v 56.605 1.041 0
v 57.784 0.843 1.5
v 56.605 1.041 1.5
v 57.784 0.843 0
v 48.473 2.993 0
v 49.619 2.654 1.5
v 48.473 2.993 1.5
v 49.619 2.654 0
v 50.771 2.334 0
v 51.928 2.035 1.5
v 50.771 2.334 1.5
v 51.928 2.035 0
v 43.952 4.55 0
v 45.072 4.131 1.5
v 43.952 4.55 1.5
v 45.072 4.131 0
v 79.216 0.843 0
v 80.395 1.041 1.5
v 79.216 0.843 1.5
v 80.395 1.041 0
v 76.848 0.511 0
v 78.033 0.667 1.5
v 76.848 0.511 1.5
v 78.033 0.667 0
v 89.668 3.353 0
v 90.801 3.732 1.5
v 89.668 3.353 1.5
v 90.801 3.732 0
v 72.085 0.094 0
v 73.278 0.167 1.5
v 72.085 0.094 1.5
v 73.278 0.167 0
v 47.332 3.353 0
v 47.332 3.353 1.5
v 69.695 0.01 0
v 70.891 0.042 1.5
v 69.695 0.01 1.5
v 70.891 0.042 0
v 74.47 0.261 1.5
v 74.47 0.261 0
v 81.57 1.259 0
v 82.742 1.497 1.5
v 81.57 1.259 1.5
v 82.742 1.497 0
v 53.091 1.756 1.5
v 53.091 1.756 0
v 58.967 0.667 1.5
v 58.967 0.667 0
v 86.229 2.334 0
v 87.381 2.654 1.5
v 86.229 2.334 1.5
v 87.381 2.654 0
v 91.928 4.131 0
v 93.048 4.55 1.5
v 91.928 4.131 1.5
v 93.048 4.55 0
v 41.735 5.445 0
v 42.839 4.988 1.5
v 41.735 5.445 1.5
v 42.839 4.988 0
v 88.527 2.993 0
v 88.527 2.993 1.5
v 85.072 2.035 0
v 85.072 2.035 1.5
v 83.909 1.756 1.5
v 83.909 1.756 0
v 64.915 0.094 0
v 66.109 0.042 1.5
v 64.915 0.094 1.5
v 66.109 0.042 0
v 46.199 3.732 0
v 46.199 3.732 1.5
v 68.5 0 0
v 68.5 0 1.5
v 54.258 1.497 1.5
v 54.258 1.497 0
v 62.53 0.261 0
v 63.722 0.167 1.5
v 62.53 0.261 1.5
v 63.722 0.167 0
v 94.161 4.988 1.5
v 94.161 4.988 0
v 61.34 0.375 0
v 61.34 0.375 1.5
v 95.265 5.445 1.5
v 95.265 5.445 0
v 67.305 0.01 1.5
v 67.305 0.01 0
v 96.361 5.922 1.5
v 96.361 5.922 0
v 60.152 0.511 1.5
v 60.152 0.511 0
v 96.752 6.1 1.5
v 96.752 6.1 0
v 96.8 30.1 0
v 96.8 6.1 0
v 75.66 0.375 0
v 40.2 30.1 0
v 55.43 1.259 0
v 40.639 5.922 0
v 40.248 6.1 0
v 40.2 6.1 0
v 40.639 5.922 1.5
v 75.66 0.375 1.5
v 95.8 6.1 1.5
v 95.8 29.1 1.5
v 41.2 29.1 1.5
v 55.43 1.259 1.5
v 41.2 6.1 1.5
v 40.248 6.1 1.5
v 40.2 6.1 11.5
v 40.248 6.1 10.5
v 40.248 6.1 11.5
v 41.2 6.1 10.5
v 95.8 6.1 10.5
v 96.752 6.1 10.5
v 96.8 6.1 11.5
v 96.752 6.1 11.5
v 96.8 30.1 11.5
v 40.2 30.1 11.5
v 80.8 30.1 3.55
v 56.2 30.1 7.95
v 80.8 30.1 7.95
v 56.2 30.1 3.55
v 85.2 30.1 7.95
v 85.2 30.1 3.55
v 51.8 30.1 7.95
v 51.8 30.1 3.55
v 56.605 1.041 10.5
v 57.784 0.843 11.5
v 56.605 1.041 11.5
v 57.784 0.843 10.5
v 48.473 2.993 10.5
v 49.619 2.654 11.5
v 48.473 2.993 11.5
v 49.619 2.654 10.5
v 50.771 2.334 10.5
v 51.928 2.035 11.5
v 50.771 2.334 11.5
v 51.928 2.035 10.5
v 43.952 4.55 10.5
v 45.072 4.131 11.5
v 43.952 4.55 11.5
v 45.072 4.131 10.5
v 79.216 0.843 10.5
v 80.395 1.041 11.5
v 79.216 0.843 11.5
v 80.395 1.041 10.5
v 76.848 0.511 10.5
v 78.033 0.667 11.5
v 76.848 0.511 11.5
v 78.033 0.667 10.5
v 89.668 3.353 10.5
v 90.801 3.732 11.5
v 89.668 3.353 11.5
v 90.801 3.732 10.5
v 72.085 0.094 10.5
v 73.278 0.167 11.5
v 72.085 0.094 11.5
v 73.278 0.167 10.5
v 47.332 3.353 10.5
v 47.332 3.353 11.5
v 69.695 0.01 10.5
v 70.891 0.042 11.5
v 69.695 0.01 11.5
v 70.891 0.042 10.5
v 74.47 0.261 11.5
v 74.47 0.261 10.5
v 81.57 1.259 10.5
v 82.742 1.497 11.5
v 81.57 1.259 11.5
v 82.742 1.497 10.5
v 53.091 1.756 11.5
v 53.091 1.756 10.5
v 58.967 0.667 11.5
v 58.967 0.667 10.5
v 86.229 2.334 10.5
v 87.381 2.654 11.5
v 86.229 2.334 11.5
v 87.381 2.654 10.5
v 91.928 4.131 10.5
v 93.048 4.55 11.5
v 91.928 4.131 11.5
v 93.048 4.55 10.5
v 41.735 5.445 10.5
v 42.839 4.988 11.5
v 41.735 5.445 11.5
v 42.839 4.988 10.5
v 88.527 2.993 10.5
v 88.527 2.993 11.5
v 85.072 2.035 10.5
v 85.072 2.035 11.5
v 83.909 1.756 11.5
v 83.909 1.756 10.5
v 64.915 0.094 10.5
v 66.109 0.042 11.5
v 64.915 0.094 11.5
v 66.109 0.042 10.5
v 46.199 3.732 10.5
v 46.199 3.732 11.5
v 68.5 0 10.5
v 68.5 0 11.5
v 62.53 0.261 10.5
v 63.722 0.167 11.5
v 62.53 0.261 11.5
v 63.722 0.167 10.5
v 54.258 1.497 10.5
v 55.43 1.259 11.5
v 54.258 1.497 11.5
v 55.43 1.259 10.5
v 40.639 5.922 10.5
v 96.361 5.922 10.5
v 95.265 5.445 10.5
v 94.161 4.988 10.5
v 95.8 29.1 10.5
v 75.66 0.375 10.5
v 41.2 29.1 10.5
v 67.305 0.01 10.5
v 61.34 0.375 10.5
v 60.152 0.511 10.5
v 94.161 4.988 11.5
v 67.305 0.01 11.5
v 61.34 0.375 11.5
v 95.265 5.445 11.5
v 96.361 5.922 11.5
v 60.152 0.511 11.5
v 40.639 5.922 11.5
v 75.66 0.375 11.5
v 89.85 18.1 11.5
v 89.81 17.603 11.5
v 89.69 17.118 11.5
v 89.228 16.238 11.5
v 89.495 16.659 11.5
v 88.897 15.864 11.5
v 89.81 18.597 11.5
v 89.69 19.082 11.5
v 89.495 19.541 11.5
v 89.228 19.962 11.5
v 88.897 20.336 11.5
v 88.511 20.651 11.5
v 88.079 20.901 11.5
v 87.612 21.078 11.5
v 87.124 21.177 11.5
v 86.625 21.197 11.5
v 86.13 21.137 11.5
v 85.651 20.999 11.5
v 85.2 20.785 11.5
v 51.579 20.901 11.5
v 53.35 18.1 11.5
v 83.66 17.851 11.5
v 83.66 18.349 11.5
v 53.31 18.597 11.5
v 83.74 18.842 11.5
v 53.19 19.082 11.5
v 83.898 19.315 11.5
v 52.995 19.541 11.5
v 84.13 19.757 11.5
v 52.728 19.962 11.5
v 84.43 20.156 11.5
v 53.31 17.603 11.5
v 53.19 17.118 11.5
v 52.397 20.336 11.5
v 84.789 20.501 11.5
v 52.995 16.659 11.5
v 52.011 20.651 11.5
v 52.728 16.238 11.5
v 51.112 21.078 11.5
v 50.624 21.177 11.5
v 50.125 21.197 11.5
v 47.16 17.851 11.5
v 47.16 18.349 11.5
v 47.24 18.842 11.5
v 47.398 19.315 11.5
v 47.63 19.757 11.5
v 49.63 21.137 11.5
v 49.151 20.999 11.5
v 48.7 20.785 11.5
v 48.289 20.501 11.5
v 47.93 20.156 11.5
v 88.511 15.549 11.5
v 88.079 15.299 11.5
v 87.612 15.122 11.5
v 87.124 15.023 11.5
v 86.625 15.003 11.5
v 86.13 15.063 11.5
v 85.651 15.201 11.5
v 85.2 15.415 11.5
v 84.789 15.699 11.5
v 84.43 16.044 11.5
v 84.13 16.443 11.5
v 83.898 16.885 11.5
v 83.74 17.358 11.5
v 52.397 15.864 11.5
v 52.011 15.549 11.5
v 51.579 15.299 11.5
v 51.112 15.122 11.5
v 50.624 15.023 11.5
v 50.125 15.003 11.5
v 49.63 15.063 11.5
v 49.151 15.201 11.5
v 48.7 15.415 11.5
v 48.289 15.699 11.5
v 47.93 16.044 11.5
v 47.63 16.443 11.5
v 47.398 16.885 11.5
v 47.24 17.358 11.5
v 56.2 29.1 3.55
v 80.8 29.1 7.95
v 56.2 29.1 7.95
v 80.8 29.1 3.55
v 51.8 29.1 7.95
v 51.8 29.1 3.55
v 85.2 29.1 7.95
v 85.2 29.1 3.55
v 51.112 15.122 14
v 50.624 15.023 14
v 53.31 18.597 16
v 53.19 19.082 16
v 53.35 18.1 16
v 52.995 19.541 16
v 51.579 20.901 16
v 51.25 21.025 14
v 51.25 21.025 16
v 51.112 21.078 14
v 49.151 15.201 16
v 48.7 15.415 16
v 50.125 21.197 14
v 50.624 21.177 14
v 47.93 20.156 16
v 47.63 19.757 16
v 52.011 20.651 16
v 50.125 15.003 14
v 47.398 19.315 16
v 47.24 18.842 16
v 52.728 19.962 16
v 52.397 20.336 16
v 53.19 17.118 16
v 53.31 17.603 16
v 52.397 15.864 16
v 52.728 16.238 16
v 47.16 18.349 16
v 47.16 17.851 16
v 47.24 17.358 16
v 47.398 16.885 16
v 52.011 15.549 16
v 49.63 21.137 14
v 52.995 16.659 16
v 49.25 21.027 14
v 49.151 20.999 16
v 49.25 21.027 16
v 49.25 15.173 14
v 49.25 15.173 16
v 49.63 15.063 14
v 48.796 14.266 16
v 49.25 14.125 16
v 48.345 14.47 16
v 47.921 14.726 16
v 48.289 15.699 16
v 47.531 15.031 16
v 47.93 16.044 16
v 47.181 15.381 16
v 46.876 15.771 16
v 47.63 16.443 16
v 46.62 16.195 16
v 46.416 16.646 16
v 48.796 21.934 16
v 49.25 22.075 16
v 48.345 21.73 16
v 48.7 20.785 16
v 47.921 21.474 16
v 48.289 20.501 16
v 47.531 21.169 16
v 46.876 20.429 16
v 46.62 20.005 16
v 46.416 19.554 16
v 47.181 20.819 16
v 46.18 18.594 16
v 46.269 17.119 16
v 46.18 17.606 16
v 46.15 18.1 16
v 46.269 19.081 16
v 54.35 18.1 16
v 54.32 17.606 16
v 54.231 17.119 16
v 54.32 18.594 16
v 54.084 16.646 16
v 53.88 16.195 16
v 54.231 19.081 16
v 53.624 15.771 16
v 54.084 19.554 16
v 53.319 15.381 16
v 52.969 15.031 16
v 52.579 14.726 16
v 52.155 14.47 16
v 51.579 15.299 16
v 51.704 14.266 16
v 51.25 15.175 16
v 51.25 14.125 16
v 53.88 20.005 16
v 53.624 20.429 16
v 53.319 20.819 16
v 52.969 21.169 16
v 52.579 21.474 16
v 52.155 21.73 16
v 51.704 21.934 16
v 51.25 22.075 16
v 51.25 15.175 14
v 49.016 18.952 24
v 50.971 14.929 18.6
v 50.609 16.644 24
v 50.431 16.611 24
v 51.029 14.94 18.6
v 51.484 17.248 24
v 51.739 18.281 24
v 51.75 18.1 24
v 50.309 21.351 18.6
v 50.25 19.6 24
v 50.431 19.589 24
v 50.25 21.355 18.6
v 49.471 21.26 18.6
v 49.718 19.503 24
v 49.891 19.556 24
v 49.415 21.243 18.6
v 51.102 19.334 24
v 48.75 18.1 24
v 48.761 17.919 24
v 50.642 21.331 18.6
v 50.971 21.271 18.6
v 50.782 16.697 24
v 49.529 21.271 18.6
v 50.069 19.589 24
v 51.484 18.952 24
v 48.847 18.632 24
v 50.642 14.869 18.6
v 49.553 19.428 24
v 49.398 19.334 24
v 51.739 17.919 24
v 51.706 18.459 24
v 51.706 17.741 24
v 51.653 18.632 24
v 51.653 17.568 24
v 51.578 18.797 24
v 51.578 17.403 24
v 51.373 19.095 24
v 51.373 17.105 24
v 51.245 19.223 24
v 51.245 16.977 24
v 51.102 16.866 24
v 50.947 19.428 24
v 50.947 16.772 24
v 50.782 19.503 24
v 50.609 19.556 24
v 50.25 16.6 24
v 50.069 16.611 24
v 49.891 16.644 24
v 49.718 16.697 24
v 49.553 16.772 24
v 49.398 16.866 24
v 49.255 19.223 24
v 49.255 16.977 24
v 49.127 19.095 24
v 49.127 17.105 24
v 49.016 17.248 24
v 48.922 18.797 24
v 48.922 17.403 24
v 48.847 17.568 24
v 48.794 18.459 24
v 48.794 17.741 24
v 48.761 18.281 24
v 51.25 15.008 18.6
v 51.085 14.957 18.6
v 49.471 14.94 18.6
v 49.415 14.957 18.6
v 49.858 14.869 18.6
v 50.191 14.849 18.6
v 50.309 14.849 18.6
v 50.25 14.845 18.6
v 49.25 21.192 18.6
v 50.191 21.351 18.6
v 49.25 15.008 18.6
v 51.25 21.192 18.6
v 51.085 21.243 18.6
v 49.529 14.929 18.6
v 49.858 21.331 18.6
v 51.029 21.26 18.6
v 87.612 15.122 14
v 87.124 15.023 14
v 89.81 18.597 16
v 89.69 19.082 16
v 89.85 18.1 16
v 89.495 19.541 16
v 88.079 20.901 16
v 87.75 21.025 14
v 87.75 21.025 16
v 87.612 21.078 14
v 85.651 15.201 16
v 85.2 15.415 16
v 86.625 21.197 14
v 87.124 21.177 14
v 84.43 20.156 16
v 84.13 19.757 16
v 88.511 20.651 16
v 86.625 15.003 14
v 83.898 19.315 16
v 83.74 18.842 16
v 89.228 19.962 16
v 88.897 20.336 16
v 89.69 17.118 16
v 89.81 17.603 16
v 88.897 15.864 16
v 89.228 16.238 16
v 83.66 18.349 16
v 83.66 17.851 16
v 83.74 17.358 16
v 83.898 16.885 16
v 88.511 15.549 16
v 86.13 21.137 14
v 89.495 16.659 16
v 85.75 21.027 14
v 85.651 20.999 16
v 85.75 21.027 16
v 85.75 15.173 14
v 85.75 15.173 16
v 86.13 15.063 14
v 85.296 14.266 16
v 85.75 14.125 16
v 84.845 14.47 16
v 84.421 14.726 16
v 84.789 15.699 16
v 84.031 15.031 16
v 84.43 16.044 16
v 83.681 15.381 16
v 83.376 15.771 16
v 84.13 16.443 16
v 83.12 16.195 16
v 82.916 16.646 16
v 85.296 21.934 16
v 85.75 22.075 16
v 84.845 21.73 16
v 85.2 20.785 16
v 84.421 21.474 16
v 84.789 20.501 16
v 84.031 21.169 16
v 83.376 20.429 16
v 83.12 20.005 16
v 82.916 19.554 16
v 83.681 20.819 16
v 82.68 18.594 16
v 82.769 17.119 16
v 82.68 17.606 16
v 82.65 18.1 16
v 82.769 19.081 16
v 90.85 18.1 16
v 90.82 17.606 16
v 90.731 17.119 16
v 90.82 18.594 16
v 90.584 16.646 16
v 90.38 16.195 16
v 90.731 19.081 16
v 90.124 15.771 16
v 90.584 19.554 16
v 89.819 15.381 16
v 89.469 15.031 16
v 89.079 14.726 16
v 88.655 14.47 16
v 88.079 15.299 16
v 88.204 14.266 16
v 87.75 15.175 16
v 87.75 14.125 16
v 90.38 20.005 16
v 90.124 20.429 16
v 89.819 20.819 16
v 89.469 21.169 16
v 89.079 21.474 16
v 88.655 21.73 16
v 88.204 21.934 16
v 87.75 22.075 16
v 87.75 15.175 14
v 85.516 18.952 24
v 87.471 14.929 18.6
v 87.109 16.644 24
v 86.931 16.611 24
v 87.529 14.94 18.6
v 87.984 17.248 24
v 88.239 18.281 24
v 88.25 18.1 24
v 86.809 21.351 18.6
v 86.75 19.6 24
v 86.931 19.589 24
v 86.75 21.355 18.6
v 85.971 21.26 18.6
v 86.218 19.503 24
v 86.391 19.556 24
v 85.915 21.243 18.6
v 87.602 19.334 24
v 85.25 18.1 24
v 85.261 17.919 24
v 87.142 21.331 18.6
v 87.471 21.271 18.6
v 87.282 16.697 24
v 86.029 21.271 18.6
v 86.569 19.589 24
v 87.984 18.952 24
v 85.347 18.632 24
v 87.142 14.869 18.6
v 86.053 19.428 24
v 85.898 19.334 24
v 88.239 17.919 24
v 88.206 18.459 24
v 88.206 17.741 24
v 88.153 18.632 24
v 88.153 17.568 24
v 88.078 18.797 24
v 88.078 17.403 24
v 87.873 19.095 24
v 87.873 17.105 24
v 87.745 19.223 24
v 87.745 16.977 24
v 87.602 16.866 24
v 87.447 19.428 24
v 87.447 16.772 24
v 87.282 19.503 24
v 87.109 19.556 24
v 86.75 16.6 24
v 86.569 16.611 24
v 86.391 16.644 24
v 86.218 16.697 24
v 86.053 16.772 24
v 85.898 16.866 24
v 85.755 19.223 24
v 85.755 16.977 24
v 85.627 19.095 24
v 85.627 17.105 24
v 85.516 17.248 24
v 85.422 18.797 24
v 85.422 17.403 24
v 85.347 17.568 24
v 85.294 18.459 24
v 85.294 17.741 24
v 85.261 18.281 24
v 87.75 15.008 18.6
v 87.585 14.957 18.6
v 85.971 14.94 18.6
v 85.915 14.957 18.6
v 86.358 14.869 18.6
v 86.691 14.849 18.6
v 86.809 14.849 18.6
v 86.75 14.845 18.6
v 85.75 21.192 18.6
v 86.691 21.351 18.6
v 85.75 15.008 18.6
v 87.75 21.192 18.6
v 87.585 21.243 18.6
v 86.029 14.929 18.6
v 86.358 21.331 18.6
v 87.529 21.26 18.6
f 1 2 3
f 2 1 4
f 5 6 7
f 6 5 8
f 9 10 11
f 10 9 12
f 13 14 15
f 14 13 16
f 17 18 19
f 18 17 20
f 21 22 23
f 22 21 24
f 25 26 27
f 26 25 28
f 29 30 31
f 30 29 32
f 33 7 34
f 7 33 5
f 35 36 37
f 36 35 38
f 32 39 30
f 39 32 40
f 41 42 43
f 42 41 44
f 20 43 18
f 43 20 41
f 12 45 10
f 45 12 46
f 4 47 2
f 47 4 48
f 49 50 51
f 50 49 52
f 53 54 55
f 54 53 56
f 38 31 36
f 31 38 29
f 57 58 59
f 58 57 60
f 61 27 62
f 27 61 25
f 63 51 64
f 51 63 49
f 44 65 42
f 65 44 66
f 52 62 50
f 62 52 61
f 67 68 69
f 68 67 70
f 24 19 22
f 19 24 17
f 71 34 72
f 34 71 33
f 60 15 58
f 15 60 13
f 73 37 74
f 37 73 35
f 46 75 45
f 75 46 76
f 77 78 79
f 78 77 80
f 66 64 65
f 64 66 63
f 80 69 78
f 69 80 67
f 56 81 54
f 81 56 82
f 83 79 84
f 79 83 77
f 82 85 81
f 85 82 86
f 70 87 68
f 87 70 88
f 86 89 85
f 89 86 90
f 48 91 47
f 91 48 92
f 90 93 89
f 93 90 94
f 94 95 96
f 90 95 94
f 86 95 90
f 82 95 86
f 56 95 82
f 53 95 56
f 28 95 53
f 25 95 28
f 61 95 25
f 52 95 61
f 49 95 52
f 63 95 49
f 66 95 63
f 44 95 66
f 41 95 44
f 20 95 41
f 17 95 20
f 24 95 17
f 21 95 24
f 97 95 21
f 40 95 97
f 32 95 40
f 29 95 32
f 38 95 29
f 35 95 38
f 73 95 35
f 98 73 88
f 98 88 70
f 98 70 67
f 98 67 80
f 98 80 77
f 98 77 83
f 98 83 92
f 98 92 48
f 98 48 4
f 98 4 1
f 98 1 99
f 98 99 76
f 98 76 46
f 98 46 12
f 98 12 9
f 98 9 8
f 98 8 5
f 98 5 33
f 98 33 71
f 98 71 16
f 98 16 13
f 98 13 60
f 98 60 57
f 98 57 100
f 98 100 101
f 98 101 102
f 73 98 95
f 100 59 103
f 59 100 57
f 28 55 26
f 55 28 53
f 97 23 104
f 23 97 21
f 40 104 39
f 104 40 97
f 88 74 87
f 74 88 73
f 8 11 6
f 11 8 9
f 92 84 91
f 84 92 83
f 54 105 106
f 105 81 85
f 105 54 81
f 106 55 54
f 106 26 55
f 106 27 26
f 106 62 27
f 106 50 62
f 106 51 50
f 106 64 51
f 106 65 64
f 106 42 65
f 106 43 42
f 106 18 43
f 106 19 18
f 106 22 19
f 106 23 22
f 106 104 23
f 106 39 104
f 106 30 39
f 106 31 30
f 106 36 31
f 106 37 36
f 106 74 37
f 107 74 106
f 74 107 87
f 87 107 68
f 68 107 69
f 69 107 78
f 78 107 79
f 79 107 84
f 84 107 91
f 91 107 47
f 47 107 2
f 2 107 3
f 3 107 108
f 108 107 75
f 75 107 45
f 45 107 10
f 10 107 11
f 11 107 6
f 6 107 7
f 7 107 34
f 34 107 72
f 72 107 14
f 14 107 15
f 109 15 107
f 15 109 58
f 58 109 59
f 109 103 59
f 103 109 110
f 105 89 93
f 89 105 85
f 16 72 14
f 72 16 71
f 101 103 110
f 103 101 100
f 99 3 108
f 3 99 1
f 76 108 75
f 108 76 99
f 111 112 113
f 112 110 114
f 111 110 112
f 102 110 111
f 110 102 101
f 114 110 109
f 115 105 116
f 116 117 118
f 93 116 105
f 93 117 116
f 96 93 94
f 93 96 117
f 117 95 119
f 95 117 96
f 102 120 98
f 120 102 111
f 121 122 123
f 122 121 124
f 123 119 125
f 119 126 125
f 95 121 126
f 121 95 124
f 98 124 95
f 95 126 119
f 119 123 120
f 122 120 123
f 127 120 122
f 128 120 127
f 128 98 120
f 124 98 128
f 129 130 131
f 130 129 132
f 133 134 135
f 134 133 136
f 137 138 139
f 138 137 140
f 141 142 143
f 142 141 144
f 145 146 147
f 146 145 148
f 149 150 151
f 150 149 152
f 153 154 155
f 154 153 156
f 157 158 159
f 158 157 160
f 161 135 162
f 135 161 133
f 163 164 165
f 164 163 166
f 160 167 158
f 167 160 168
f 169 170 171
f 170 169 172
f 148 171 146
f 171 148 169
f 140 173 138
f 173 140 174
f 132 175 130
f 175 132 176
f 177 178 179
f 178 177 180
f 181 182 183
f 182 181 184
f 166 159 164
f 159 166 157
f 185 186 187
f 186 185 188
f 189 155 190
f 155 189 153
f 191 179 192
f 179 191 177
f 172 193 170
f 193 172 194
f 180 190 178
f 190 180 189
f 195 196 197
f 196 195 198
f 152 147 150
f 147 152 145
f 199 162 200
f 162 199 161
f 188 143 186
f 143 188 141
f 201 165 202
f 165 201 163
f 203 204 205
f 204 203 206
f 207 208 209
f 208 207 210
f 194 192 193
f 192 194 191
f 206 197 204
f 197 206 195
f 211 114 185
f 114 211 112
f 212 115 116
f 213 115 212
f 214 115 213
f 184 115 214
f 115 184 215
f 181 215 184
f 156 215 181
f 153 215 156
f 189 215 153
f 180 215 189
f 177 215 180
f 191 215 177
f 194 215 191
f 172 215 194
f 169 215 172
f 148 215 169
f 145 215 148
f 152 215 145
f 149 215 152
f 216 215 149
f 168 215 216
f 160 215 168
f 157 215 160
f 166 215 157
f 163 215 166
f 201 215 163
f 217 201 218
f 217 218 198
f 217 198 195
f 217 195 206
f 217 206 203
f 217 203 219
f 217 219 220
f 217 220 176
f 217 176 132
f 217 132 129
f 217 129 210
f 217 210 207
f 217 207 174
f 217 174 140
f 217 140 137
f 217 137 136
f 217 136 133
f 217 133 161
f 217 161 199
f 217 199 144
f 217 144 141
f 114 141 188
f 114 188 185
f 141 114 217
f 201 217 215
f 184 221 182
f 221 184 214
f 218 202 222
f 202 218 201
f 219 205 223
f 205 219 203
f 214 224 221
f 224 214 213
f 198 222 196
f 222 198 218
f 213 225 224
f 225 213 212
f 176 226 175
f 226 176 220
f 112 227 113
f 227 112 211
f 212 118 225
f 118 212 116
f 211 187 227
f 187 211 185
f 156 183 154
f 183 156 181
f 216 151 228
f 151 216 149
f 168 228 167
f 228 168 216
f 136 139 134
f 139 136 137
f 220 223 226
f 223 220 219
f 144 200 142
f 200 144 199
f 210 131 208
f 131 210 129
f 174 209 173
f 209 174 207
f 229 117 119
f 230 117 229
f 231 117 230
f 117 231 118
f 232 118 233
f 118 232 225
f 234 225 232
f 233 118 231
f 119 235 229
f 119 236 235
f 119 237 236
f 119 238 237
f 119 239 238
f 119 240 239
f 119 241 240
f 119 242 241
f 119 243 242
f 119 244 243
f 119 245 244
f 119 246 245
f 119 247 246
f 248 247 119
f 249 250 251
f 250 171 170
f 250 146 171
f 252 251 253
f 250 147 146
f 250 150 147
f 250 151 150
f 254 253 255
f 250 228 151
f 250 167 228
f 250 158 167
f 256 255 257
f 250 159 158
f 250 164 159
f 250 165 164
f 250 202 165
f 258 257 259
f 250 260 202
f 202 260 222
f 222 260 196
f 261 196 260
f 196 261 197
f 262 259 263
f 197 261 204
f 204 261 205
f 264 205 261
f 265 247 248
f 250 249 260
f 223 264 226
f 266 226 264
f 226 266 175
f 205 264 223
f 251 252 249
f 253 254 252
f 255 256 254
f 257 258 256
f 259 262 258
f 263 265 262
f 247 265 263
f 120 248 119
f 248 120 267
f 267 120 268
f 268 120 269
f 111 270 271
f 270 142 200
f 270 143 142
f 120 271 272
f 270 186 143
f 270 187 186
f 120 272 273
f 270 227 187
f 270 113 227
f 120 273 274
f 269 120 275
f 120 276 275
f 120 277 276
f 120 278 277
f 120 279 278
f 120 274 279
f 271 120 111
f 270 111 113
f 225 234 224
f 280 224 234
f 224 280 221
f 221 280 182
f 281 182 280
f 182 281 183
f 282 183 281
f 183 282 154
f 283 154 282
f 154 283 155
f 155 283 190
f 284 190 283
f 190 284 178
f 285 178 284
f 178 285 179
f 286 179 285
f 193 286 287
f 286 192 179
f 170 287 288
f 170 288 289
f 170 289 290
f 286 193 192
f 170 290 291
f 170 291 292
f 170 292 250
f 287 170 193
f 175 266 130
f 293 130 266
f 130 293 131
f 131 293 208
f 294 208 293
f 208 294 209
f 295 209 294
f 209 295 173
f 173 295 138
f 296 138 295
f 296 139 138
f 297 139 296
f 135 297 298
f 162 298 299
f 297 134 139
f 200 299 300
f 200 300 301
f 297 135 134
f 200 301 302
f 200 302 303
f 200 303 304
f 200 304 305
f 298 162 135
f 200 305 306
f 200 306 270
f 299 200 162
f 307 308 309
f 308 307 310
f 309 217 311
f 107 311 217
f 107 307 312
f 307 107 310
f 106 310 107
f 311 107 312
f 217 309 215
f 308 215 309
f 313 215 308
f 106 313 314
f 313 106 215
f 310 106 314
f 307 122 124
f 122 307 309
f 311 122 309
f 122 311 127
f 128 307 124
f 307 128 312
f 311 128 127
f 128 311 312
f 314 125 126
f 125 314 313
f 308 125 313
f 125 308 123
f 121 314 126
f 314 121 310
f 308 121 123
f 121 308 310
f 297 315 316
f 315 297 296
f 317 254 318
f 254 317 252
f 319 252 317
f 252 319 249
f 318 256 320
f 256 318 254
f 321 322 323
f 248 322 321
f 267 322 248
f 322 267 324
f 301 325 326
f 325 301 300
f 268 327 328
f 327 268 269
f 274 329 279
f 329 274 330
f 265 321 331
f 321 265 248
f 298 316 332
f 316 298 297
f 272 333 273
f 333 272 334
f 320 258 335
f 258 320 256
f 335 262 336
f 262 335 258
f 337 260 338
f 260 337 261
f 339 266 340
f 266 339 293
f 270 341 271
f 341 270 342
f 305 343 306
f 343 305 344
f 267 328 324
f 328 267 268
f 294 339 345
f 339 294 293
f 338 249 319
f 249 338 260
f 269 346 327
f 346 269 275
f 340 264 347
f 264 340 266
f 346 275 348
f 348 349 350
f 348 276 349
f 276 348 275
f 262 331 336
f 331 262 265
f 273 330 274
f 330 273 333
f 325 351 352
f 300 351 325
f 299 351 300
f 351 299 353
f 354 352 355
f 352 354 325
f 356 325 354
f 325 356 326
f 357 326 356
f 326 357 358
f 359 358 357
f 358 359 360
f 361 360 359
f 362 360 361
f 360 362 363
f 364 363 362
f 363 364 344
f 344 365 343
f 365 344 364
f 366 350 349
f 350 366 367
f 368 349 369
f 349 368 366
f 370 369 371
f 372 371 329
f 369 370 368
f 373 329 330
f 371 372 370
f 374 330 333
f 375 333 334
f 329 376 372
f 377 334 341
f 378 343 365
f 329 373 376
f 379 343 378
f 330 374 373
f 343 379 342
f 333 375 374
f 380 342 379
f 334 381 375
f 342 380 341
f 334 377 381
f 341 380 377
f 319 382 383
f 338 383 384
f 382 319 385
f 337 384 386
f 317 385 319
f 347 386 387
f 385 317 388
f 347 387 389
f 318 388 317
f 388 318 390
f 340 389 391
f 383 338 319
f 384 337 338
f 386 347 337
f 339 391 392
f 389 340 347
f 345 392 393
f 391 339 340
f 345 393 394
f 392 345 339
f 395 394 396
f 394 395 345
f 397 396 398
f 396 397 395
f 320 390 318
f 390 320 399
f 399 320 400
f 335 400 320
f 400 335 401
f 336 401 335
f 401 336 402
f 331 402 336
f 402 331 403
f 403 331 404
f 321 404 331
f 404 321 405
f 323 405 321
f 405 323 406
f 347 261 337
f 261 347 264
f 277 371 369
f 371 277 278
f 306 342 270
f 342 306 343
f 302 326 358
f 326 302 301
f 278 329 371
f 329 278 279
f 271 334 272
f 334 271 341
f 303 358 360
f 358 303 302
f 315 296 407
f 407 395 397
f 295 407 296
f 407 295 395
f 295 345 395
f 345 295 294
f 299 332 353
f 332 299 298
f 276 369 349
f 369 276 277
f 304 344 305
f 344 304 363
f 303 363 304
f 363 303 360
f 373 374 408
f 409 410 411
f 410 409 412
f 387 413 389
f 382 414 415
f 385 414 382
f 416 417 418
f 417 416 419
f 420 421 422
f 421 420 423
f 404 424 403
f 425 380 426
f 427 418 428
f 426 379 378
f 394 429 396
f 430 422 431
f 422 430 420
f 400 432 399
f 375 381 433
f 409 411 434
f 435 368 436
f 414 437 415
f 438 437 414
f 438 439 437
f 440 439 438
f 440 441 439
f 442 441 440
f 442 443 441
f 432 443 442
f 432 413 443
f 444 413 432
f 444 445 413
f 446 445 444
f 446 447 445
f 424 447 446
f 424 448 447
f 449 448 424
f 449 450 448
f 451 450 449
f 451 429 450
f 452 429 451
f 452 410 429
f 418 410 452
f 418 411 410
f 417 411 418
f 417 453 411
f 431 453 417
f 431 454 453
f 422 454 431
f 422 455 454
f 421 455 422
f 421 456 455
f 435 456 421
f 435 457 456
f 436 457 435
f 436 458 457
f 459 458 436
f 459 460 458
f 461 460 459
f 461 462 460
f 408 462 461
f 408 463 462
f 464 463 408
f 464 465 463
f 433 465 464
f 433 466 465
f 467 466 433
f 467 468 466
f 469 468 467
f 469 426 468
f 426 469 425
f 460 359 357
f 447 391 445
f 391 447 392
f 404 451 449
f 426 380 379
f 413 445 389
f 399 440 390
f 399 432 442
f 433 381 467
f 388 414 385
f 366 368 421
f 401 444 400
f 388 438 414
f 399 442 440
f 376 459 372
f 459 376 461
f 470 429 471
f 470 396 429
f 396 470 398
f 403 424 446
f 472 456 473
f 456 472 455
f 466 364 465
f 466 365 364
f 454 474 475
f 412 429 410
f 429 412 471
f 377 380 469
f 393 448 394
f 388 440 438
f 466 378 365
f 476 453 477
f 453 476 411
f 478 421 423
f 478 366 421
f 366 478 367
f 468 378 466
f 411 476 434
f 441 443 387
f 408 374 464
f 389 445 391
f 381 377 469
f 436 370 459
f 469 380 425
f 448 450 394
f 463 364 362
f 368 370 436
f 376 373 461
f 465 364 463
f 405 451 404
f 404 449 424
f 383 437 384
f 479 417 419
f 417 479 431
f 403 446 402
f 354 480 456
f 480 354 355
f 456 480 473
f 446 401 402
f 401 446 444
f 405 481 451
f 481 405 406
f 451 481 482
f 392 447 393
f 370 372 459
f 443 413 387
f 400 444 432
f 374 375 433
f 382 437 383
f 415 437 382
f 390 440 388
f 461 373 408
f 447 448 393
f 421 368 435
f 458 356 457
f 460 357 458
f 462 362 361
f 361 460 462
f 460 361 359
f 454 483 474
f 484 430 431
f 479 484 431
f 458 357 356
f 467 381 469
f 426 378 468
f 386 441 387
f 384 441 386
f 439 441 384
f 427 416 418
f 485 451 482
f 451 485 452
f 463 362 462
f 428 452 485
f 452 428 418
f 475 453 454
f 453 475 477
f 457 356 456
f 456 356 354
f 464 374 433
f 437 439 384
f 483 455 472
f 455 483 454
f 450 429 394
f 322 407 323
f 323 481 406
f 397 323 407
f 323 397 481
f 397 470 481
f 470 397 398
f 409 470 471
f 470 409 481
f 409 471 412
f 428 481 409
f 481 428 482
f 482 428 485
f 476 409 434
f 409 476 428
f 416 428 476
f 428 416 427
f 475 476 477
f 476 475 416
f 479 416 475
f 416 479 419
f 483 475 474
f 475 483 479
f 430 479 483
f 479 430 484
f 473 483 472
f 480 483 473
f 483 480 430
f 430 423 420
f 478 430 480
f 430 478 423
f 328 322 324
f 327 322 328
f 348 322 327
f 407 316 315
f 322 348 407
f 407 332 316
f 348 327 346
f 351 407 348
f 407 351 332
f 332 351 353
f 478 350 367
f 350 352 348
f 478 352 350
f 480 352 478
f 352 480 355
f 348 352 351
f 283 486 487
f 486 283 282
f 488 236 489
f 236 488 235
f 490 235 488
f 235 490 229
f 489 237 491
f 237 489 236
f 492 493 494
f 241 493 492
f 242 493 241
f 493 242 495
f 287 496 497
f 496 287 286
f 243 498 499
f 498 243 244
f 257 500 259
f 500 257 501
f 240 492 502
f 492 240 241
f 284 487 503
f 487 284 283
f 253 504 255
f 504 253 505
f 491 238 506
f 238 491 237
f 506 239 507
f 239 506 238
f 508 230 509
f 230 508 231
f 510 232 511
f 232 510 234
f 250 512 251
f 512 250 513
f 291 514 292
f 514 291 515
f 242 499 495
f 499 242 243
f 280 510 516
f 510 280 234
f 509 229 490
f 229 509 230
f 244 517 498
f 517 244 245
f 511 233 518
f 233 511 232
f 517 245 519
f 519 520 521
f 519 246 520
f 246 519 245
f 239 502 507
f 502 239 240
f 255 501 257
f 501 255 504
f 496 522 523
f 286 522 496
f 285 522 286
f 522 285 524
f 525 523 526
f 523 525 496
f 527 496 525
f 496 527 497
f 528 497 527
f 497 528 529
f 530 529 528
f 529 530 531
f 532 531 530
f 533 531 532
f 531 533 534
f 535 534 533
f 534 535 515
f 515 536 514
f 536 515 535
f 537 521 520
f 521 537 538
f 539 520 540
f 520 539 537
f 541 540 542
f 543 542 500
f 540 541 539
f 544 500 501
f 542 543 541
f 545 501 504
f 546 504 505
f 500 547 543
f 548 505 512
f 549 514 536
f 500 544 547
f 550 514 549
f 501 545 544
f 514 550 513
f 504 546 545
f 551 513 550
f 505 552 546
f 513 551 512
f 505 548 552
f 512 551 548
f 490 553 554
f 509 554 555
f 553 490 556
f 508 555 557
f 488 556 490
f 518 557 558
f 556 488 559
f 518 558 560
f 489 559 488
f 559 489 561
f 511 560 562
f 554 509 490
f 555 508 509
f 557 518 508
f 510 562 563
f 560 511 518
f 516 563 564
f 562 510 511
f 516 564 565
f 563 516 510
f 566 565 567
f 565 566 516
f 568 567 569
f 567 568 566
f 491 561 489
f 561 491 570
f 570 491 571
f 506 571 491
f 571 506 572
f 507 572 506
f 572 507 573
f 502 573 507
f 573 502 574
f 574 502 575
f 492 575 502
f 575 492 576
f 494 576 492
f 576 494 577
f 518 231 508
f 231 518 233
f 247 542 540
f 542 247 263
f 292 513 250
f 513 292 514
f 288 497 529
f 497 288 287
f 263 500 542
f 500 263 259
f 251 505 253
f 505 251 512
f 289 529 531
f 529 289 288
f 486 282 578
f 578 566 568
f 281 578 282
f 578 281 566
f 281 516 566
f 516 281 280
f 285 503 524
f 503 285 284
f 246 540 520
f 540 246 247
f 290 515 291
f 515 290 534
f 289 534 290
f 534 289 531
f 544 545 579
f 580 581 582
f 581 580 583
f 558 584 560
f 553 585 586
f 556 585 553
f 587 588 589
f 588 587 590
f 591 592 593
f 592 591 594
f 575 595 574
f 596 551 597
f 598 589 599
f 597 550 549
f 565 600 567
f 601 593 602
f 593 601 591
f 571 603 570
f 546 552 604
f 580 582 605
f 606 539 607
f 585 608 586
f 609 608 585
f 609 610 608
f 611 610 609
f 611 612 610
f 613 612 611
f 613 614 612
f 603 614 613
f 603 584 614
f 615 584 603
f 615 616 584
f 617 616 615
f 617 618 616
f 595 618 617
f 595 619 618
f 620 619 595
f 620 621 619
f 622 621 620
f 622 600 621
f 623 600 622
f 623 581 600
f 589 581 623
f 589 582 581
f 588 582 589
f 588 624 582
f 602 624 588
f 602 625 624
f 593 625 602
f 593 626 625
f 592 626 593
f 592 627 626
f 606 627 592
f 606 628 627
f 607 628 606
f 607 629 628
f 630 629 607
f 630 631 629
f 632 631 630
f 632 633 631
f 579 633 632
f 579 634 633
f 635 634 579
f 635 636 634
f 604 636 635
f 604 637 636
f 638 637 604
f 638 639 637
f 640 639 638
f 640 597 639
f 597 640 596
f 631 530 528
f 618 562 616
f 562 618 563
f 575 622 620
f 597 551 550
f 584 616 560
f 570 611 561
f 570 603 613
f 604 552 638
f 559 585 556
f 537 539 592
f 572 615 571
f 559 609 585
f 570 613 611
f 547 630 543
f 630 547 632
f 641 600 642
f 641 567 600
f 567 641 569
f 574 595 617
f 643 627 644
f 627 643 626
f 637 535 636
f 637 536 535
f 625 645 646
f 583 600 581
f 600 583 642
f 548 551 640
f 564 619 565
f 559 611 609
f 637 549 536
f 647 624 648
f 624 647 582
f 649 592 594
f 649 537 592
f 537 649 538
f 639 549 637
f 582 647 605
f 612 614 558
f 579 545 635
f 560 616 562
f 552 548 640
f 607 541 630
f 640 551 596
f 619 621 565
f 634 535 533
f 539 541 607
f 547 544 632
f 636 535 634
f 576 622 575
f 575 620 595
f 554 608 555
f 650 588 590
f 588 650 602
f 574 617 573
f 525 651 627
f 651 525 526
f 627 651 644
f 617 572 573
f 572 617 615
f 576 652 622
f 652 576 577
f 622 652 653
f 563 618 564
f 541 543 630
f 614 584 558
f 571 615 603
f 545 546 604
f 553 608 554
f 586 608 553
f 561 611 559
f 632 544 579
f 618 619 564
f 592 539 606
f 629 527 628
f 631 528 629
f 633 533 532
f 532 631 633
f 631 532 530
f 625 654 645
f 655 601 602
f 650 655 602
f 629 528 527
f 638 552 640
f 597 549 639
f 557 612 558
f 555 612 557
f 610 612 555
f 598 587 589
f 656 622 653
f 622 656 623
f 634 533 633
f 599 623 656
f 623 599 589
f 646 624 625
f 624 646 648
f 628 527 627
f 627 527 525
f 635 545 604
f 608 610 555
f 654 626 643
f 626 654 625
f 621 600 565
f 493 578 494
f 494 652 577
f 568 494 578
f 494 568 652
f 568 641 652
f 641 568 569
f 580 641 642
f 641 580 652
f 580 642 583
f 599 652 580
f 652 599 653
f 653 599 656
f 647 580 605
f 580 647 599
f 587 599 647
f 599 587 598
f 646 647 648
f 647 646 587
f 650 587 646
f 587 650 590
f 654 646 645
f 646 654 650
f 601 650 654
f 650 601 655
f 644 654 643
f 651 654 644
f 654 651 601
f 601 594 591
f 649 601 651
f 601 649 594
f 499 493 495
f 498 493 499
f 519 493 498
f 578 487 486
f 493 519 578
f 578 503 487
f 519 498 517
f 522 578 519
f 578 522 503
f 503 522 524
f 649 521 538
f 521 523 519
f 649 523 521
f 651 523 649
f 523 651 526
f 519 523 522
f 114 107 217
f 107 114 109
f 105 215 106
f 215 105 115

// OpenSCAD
// Bed slat retainer
// RJL Oct 2017

$fs=0.5+0; // The plus hides from Customizer.
$fa=1+0;
manifold = 0.01+0;

/* [Retainer Values] */
// Width of retainer (exterior).
width = 56.6; 
// Depth, not counting arc area
depth = 24;     
// Dia. of arc of top/bottom; Changing this will require changing chord_offset and vice versa.
arc_diameter = 137; 
// Distance from chord of arc to curve. Use 0 for straight front.
chord_offset = 6.1; 
// Top panel has the pegs (but in use is actually the bottom panel!).
top_panel_thickness = 1; 
bottom_panel_thickness = 1.5;
// Other walls
wall_thickness = 1; 
// Gap where slat goes.
slat_height = 9;    
// Rear hole size, presumably for air escape?
rear_hole = 4.4;    
// Distance between rear hole centres.
rear_hole_centre_distance = 29;     

/* [Pegs} */
// Distance of centre of peg from rear
peg_from_rear = 12;     
// Distance between peg centres.
peg_centre_distance = 36.5;     
peg_main_dia = 6.2;
peg_main_height = 4.5;
peg_cone_top_dia = 3;
peg_cone_bottom_dia = 8.2;
peg_cone_height = 8;
// The compression slot (cutout) in the pegs.
peg_cutout_width = 2;
peg_cutout_height = 4.6;
peg_cutout_offset = 2.5;    // Bottom of cutout above top panel
// -- End of parameters ---
total_height = bottom_panel_thickness+slat_height+top_panel_thickness;
echo ("Total height: ", total_height);

total_depth = depth+chord_offset; // Just for reference; not used in calculations.
echo ("Total depth: ", total_depth);

// Print on edge ("rear wall") with supports (pegs being horizontal), so rotate in slicer (unless bridging works well).

// --- Modules ---

module panel (thickness) {
    difference(){
    translate ([arc_diameter/2, arc_diameter/2, 0]) cylinder(d=arc_diameter, h=thickness);
    translate ([0, chord_offset , -manifold]) cube([arc_diameter, arc_diameter, thickness+manifold*2]);
    }
    translate ([arc_diameter/2-width/2, chord_offset , 0]) cube ([width, depth, thickness]);
}

module peg () {
    
    difference () {
    union() {
    cylinder(d=peg_main_dia, h=peg_main_height);
    translate([0, 0, peg_main_height]) cylinder(d1=peg_cone_bottom_dia, d2=peg_cone_top_dia, h=peg_cone_height);
    }
     translate([-peg_cutout_width/2, -peg_cone_bottom_dia/2, peg_cutout_offset]) cube([peg_cutout_width, peg_cone_bottom_dia, peg_cutout_height]);
  }
}

// --- Execute ---

// Bottom panel
panel(bottom_panel_thickness);

// Top panel
translate([0, 0, bottom_panel_thickness+slat_height]) panel(top_panel_thickness);

// Left wall
translate([arc_diameter/2-width/2, chord_offset, bottom_panel_thickness]) cube ([wall_thickness, depth, slat_height]);

// Right wall
translate([arc_diameter/2+width/2-wall_thickness, chord_offset, bottom_panel_thickness]) cube ([wall_thickness, depth, slat_height]);

// Rear wall
difference() {
translate([arc_diameter/2-width/2, chord_offset+depth-wall_thickness, bottom_panel_thickness]) cube ([width, wall_thickness, slat_height]);
//  Rear holes
translate([ arc_diameter/2-rear_hole/2-rear_hole_centre_distance/2, chord_offset+depth-wall_thickness, total_height/2-rear_hole/2]) cube([rear_hole, wall_thickness*2,rear_hole]);
translate([ arc_diameter/2-rear_hole/2+rear_hole_centre_distance/2, chord_offset+depth-wall_thickness, total_height/2-rear_hole/2]) cube([rear_hole, wall_thickness*2,rear_hole]);
}

translate([arc_diameter/2-peg_centre_distance/2, chord_offset+depth-peg_from_rear, total_height]) peg();
translate([arc_diameter/2+peg_centre_distance/2, chord_offset+depth-peg_from_rear, total_height]) peg();
